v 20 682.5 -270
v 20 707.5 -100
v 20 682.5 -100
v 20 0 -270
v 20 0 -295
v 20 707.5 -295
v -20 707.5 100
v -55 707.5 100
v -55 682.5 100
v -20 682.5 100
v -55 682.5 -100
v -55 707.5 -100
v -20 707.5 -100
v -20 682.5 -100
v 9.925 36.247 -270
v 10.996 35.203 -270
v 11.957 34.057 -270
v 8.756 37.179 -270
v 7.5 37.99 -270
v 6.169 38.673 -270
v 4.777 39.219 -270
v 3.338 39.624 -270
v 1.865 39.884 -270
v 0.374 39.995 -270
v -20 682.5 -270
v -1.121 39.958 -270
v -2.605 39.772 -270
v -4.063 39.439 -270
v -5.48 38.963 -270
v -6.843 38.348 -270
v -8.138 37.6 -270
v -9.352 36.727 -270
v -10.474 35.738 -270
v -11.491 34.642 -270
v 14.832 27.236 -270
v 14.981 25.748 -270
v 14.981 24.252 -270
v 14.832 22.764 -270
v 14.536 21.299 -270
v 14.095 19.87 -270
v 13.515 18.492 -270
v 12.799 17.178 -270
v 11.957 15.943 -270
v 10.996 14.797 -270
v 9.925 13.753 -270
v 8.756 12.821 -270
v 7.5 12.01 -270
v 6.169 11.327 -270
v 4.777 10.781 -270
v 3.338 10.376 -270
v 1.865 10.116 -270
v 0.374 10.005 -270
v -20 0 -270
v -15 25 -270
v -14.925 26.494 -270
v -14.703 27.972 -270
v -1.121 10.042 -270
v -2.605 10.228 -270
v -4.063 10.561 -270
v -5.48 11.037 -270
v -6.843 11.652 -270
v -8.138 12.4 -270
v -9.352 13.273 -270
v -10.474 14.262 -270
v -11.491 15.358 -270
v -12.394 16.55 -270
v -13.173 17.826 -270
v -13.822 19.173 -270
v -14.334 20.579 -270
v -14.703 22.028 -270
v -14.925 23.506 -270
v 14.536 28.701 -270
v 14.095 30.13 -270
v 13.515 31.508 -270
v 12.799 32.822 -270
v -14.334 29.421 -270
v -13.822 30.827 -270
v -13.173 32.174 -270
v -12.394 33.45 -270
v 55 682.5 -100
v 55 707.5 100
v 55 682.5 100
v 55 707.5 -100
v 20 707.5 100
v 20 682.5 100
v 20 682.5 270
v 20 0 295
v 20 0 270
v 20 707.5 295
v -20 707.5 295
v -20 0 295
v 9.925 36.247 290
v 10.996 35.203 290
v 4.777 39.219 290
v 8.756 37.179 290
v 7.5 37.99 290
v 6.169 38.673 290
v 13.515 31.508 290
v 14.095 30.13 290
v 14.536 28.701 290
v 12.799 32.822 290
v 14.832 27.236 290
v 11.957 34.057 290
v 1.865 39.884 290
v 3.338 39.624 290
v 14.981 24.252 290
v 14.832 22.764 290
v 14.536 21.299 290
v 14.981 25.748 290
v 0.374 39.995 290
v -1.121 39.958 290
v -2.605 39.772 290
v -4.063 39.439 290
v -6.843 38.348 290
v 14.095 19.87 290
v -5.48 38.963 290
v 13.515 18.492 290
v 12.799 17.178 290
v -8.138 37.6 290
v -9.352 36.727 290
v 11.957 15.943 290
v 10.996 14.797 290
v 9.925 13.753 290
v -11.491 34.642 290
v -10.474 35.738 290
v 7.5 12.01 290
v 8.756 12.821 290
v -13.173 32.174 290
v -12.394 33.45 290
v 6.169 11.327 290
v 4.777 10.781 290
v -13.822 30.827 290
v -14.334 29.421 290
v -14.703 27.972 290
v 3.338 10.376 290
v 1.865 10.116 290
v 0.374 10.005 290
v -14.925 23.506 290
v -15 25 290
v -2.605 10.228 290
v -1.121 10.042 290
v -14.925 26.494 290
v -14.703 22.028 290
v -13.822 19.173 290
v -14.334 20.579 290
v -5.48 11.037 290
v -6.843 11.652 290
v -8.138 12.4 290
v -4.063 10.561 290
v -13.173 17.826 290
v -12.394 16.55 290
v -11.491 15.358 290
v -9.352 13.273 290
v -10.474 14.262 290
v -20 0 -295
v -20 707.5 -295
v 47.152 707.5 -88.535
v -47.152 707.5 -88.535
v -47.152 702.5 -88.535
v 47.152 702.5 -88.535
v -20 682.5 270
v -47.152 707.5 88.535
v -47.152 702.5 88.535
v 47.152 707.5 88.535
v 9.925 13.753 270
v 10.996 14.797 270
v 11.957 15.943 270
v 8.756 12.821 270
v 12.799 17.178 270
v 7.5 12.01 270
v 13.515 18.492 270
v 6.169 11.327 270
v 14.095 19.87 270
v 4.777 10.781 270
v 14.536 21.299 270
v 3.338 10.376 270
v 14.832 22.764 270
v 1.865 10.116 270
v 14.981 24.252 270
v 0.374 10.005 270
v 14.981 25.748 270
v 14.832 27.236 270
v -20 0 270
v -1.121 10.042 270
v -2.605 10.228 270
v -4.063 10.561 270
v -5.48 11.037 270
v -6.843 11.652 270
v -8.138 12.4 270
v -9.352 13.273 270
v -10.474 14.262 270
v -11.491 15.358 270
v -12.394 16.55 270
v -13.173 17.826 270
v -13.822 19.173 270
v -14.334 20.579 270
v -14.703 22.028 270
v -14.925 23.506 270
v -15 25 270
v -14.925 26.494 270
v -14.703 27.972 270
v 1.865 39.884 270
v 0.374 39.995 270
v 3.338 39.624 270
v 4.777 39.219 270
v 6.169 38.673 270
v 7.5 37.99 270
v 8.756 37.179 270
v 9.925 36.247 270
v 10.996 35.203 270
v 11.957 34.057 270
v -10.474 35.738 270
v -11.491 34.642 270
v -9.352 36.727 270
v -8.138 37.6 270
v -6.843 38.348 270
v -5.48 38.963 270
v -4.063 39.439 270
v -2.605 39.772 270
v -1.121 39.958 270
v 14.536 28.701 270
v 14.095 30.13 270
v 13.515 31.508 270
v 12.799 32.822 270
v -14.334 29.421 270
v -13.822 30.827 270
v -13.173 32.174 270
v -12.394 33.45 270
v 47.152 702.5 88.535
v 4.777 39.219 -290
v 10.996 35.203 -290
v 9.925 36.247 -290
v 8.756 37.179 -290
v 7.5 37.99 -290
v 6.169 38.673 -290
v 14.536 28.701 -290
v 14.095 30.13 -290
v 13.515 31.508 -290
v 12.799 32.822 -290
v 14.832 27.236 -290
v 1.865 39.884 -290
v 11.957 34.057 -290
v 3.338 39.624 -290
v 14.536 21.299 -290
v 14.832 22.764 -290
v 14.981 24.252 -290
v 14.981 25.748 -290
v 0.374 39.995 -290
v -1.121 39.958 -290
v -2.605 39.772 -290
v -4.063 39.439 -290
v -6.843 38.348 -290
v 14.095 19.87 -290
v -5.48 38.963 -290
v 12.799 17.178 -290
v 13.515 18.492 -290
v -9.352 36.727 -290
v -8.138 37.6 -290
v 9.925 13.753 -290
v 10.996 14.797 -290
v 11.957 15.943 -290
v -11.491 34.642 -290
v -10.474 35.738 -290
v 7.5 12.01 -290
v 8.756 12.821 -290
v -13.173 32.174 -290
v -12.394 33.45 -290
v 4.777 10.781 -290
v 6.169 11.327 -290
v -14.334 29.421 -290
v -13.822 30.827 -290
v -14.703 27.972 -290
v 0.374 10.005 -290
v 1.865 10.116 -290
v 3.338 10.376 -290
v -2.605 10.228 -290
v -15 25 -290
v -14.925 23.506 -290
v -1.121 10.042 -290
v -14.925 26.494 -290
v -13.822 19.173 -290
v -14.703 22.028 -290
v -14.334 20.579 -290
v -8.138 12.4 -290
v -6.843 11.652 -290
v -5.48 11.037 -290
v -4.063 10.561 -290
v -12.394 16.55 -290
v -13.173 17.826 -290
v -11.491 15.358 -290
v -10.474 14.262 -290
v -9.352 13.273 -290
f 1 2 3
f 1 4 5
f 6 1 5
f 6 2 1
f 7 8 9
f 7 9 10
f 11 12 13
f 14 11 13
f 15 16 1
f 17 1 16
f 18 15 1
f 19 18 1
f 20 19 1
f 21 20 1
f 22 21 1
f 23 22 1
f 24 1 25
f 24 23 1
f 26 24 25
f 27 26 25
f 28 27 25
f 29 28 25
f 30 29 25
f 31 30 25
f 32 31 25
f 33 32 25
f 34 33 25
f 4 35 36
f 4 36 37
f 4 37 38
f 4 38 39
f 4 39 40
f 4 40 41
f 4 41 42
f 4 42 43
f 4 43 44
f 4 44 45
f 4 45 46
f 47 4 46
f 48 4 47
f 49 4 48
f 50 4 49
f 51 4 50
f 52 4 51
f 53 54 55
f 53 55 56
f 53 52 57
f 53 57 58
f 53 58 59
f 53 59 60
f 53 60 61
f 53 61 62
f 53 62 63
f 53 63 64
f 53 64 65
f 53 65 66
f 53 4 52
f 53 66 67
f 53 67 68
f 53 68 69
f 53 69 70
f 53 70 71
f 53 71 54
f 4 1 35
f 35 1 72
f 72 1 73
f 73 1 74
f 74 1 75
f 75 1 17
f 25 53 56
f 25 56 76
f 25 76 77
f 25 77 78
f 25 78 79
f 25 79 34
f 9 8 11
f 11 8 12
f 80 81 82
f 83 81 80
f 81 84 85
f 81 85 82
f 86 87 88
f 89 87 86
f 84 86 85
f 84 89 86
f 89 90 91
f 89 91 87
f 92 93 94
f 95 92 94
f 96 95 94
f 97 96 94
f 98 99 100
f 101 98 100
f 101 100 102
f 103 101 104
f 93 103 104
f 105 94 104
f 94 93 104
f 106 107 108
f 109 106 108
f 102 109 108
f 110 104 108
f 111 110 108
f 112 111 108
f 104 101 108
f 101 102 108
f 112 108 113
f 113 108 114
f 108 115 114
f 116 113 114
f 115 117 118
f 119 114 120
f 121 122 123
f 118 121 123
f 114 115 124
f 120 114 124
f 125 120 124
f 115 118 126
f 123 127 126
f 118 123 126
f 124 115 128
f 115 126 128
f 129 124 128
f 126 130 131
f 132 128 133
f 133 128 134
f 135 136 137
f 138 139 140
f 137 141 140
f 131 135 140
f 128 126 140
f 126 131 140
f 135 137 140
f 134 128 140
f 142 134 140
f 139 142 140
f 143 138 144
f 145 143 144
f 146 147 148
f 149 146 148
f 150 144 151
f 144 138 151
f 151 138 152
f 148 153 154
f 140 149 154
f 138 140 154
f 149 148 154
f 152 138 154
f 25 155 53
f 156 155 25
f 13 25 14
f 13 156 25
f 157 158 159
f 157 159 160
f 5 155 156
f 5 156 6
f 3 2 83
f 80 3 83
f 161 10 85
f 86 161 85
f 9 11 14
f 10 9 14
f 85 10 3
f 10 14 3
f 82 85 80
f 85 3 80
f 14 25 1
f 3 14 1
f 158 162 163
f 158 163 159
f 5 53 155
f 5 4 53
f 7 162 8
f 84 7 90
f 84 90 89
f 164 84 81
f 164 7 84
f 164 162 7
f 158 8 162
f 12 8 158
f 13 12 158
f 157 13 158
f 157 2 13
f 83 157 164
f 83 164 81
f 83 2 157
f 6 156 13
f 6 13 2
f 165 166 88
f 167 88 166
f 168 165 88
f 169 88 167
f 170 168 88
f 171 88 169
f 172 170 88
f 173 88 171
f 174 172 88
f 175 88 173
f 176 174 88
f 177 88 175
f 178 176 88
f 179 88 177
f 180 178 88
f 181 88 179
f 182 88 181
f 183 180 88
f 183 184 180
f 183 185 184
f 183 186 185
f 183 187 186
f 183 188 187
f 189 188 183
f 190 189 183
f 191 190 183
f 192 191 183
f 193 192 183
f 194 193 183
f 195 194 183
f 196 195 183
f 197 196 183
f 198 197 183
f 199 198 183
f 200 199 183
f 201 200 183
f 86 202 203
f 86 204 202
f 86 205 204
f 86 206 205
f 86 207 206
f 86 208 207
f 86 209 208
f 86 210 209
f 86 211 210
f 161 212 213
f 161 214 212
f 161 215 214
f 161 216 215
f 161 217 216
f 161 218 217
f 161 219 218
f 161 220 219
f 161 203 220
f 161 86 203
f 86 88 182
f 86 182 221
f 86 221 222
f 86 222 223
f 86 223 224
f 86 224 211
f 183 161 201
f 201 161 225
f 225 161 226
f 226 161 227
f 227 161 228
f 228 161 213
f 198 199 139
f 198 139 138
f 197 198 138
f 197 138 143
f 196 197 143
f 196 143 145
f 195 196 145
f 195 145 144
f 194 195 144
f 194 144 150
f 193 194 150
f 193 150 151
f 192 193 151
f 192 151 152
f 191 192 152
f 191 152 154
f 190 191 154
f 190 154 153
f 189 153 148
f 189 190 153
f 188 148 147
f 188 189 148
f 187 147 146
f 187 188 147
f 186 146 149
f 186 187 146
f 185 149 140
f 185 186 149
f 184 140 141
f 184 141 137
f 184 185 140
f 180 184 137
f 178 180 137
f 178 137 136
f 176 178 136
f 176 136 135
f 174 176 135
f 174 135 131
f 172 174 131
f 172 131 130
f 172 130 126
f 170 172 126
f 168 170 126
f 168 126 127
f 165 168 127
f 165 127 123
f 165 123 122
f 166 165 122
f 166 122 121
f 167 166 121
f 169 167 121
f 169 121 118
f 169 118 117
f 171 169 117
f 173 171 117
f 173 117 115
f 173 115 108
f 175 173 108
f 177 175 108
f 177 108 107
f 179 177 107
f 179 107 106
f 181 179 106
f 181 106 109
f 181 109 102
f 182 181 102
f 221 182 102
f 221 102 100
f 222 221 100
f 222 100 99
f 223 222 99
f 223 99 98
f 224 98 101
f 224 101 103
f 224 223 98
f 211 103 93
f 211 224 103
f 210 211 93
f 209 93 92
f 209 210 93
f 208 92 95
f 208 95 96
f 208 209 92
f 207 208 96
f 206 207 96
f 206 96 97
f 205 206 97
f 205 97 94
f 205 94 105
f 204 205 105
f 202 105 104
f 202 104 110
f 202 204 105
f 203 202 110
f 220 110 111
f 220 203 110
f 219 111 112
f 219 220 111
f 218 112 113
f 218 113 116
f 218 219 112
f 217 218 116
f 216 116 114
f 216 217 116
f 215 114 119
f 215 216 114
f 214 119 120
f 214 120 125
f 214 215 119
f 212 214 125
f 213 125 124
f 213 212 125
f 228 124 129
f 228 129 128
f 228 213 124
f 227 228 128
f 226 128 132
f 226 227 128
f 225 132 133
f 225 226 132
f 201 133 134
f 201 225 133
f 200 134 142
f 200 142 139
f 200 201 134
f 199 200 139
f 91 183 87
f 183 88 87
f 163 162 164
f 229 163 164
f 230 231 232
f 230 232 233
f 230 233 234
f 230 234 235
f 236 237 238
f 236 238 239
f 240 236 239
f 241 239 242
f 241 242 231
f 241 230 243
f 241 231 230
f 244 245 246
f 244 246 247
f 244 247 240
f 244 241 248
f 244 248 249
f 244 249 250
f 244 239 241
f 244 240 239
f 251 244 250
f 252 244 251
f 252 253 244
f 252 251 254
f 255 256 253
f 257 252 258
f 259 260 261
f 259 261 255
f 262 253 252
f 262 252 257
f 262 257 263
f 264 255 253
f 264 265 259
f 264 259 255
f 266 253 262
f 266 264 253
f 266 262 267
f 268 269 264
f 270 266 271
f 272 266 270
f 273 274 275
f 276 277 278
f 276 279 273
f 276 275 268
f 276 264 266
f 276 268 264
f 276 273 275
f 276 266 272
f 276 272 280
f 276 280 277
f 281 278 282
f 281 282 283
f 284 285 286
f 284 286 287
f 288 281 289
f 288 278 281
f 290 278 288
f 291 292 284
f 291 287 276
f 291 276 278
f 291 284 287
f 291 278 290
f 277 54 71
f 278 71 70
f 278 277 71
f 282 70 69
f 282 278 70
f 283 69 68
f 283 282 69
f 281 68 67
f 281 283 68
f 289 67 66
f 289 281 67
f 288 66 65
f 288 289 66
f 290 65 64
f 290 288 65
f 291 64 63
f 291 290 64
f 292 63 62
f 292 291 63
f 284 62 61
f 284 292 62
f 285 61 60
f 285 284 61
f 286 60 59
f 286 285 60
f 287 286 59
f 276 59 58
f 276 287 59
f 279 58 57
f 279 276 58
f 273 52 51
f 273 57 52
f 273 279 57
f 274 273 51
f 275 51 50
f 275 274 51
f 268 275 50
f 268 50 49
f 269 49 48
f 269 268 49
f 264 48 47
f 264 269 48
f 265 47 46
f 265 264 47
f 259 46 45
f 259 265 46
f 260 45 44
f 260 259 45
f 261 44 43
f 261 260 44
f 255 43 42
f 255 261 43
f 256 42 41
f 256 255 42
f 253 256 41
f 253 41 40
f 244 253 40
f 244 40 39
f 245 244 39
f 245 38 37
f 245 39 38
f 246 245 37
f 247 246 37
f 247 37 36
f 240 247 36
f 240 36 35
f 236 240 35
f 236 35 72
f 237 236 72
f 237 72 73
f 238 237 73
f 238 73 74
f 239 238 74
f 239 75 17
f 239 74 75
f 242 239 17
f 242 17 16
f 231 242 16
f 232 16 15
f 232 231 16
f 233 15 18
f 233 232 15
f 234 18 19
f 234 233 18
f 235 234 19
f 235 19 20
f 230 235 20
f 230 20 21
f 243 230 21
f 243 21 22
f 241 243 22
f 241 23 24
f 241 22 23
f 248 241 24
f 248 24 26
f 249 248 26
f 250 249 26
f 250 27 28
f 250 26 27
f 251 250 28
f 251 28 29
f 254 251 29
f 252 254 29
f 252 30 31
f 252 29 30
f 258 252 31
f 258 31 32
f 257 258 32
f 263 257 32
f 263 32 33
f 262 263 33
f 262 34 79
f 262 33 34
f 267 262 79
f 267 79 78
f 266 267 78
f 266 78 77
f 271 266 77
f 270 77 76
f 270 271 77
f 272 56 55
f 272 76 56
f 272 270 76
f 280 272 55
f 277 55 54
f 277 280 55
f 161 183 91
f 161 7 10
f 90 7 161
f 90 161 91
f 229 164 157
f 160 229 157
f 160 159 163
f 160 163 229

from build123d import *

# Parameters (mm, degrees)
SKETCH3_W               = 40
SKETCH3_H               = 25
CUT_EXTRUDE1_DEPTH      = 290
CUT_EXTRUDE1_DEPTH_BACK = 290
SKETCH4_R               = 15
SKETCH5_W               = 110
SKETCH5_H               = 200
BOSS_EXTRUDE1_DEPTH     = 25
SKETCH6_W               = 94.303635564
SKETCH6_H               = 177.0699427
CUT_EXTRUDE2_DEPTH      = 5


with BuildPart() as part:
    # Sweep1: sweep along a path in Sketch2
    with BuildLine(Plane(origin=(0, 0, 0), x_dir=(0, 0, -1), z_dir=(1, 0, 0))) as sweep1_path:
        Line((-282.5, 0), (-282.5, 695))
        Line((-282.5, 695), (282.5, 695))
        Line((282.5, 695), (282.5, 0))
    # Sketch3 → Sweep1 (sweep)
    with BuildSketch(Plane(origin=(0, 0, 0), x_dir=(1, 0, 0), z_dir=(0, 1, 0))):
        with Locations((0, -282.5)):
            Rectangle(SKETCH3_W, SKETCH3_H)
    sweep(path=sweep1_path.line, transition=Transition.RIGHT)

    # Sketch4 → Cut-Extrude1 (cut, two sides: drawn at the far end of the back side and taken through both)
    with BuildSketch(Plane.XY.offset(-CUT_EXTRUDE1_DEPTH_BACK)):
        with Locations(Location((0, 25, 0), (0, 0, 180))):
            Circle(SKETCH4_R)
    extrude(amount=CUT_EXTRUDE1_DEPTH + CUT_EXTRUDE1_DEPTH_BACK, mode=Mode.SUBTRACT)

    # Sketch5 → Boss-Extrude1 (add)
    with BuildSketch(Plane(origin=(0, 707.5, 0), x_dir=(1, 0, 0), z_dir=(0, 1, 0))):
        Rectangle(SKETCH5_W, SKETCH5_H)
    extrude(amount=-BOSS_EXTRUDE1_DEPTH)

    # Sketch6 → Cut-Extrude2 (cut)
    with BuildSketch(Plane(origin=(0, 707.5, 0), x_dir=(1, 0, 0), z_dir=(0, 1, 0))):
        Rectangle(SKETCH6_W, SKETCH6_H)
    extrude(amount=-CUT_EXTRUDE2_DEPTH, mode=Mode.SUBTRACT)


solid = part.part
